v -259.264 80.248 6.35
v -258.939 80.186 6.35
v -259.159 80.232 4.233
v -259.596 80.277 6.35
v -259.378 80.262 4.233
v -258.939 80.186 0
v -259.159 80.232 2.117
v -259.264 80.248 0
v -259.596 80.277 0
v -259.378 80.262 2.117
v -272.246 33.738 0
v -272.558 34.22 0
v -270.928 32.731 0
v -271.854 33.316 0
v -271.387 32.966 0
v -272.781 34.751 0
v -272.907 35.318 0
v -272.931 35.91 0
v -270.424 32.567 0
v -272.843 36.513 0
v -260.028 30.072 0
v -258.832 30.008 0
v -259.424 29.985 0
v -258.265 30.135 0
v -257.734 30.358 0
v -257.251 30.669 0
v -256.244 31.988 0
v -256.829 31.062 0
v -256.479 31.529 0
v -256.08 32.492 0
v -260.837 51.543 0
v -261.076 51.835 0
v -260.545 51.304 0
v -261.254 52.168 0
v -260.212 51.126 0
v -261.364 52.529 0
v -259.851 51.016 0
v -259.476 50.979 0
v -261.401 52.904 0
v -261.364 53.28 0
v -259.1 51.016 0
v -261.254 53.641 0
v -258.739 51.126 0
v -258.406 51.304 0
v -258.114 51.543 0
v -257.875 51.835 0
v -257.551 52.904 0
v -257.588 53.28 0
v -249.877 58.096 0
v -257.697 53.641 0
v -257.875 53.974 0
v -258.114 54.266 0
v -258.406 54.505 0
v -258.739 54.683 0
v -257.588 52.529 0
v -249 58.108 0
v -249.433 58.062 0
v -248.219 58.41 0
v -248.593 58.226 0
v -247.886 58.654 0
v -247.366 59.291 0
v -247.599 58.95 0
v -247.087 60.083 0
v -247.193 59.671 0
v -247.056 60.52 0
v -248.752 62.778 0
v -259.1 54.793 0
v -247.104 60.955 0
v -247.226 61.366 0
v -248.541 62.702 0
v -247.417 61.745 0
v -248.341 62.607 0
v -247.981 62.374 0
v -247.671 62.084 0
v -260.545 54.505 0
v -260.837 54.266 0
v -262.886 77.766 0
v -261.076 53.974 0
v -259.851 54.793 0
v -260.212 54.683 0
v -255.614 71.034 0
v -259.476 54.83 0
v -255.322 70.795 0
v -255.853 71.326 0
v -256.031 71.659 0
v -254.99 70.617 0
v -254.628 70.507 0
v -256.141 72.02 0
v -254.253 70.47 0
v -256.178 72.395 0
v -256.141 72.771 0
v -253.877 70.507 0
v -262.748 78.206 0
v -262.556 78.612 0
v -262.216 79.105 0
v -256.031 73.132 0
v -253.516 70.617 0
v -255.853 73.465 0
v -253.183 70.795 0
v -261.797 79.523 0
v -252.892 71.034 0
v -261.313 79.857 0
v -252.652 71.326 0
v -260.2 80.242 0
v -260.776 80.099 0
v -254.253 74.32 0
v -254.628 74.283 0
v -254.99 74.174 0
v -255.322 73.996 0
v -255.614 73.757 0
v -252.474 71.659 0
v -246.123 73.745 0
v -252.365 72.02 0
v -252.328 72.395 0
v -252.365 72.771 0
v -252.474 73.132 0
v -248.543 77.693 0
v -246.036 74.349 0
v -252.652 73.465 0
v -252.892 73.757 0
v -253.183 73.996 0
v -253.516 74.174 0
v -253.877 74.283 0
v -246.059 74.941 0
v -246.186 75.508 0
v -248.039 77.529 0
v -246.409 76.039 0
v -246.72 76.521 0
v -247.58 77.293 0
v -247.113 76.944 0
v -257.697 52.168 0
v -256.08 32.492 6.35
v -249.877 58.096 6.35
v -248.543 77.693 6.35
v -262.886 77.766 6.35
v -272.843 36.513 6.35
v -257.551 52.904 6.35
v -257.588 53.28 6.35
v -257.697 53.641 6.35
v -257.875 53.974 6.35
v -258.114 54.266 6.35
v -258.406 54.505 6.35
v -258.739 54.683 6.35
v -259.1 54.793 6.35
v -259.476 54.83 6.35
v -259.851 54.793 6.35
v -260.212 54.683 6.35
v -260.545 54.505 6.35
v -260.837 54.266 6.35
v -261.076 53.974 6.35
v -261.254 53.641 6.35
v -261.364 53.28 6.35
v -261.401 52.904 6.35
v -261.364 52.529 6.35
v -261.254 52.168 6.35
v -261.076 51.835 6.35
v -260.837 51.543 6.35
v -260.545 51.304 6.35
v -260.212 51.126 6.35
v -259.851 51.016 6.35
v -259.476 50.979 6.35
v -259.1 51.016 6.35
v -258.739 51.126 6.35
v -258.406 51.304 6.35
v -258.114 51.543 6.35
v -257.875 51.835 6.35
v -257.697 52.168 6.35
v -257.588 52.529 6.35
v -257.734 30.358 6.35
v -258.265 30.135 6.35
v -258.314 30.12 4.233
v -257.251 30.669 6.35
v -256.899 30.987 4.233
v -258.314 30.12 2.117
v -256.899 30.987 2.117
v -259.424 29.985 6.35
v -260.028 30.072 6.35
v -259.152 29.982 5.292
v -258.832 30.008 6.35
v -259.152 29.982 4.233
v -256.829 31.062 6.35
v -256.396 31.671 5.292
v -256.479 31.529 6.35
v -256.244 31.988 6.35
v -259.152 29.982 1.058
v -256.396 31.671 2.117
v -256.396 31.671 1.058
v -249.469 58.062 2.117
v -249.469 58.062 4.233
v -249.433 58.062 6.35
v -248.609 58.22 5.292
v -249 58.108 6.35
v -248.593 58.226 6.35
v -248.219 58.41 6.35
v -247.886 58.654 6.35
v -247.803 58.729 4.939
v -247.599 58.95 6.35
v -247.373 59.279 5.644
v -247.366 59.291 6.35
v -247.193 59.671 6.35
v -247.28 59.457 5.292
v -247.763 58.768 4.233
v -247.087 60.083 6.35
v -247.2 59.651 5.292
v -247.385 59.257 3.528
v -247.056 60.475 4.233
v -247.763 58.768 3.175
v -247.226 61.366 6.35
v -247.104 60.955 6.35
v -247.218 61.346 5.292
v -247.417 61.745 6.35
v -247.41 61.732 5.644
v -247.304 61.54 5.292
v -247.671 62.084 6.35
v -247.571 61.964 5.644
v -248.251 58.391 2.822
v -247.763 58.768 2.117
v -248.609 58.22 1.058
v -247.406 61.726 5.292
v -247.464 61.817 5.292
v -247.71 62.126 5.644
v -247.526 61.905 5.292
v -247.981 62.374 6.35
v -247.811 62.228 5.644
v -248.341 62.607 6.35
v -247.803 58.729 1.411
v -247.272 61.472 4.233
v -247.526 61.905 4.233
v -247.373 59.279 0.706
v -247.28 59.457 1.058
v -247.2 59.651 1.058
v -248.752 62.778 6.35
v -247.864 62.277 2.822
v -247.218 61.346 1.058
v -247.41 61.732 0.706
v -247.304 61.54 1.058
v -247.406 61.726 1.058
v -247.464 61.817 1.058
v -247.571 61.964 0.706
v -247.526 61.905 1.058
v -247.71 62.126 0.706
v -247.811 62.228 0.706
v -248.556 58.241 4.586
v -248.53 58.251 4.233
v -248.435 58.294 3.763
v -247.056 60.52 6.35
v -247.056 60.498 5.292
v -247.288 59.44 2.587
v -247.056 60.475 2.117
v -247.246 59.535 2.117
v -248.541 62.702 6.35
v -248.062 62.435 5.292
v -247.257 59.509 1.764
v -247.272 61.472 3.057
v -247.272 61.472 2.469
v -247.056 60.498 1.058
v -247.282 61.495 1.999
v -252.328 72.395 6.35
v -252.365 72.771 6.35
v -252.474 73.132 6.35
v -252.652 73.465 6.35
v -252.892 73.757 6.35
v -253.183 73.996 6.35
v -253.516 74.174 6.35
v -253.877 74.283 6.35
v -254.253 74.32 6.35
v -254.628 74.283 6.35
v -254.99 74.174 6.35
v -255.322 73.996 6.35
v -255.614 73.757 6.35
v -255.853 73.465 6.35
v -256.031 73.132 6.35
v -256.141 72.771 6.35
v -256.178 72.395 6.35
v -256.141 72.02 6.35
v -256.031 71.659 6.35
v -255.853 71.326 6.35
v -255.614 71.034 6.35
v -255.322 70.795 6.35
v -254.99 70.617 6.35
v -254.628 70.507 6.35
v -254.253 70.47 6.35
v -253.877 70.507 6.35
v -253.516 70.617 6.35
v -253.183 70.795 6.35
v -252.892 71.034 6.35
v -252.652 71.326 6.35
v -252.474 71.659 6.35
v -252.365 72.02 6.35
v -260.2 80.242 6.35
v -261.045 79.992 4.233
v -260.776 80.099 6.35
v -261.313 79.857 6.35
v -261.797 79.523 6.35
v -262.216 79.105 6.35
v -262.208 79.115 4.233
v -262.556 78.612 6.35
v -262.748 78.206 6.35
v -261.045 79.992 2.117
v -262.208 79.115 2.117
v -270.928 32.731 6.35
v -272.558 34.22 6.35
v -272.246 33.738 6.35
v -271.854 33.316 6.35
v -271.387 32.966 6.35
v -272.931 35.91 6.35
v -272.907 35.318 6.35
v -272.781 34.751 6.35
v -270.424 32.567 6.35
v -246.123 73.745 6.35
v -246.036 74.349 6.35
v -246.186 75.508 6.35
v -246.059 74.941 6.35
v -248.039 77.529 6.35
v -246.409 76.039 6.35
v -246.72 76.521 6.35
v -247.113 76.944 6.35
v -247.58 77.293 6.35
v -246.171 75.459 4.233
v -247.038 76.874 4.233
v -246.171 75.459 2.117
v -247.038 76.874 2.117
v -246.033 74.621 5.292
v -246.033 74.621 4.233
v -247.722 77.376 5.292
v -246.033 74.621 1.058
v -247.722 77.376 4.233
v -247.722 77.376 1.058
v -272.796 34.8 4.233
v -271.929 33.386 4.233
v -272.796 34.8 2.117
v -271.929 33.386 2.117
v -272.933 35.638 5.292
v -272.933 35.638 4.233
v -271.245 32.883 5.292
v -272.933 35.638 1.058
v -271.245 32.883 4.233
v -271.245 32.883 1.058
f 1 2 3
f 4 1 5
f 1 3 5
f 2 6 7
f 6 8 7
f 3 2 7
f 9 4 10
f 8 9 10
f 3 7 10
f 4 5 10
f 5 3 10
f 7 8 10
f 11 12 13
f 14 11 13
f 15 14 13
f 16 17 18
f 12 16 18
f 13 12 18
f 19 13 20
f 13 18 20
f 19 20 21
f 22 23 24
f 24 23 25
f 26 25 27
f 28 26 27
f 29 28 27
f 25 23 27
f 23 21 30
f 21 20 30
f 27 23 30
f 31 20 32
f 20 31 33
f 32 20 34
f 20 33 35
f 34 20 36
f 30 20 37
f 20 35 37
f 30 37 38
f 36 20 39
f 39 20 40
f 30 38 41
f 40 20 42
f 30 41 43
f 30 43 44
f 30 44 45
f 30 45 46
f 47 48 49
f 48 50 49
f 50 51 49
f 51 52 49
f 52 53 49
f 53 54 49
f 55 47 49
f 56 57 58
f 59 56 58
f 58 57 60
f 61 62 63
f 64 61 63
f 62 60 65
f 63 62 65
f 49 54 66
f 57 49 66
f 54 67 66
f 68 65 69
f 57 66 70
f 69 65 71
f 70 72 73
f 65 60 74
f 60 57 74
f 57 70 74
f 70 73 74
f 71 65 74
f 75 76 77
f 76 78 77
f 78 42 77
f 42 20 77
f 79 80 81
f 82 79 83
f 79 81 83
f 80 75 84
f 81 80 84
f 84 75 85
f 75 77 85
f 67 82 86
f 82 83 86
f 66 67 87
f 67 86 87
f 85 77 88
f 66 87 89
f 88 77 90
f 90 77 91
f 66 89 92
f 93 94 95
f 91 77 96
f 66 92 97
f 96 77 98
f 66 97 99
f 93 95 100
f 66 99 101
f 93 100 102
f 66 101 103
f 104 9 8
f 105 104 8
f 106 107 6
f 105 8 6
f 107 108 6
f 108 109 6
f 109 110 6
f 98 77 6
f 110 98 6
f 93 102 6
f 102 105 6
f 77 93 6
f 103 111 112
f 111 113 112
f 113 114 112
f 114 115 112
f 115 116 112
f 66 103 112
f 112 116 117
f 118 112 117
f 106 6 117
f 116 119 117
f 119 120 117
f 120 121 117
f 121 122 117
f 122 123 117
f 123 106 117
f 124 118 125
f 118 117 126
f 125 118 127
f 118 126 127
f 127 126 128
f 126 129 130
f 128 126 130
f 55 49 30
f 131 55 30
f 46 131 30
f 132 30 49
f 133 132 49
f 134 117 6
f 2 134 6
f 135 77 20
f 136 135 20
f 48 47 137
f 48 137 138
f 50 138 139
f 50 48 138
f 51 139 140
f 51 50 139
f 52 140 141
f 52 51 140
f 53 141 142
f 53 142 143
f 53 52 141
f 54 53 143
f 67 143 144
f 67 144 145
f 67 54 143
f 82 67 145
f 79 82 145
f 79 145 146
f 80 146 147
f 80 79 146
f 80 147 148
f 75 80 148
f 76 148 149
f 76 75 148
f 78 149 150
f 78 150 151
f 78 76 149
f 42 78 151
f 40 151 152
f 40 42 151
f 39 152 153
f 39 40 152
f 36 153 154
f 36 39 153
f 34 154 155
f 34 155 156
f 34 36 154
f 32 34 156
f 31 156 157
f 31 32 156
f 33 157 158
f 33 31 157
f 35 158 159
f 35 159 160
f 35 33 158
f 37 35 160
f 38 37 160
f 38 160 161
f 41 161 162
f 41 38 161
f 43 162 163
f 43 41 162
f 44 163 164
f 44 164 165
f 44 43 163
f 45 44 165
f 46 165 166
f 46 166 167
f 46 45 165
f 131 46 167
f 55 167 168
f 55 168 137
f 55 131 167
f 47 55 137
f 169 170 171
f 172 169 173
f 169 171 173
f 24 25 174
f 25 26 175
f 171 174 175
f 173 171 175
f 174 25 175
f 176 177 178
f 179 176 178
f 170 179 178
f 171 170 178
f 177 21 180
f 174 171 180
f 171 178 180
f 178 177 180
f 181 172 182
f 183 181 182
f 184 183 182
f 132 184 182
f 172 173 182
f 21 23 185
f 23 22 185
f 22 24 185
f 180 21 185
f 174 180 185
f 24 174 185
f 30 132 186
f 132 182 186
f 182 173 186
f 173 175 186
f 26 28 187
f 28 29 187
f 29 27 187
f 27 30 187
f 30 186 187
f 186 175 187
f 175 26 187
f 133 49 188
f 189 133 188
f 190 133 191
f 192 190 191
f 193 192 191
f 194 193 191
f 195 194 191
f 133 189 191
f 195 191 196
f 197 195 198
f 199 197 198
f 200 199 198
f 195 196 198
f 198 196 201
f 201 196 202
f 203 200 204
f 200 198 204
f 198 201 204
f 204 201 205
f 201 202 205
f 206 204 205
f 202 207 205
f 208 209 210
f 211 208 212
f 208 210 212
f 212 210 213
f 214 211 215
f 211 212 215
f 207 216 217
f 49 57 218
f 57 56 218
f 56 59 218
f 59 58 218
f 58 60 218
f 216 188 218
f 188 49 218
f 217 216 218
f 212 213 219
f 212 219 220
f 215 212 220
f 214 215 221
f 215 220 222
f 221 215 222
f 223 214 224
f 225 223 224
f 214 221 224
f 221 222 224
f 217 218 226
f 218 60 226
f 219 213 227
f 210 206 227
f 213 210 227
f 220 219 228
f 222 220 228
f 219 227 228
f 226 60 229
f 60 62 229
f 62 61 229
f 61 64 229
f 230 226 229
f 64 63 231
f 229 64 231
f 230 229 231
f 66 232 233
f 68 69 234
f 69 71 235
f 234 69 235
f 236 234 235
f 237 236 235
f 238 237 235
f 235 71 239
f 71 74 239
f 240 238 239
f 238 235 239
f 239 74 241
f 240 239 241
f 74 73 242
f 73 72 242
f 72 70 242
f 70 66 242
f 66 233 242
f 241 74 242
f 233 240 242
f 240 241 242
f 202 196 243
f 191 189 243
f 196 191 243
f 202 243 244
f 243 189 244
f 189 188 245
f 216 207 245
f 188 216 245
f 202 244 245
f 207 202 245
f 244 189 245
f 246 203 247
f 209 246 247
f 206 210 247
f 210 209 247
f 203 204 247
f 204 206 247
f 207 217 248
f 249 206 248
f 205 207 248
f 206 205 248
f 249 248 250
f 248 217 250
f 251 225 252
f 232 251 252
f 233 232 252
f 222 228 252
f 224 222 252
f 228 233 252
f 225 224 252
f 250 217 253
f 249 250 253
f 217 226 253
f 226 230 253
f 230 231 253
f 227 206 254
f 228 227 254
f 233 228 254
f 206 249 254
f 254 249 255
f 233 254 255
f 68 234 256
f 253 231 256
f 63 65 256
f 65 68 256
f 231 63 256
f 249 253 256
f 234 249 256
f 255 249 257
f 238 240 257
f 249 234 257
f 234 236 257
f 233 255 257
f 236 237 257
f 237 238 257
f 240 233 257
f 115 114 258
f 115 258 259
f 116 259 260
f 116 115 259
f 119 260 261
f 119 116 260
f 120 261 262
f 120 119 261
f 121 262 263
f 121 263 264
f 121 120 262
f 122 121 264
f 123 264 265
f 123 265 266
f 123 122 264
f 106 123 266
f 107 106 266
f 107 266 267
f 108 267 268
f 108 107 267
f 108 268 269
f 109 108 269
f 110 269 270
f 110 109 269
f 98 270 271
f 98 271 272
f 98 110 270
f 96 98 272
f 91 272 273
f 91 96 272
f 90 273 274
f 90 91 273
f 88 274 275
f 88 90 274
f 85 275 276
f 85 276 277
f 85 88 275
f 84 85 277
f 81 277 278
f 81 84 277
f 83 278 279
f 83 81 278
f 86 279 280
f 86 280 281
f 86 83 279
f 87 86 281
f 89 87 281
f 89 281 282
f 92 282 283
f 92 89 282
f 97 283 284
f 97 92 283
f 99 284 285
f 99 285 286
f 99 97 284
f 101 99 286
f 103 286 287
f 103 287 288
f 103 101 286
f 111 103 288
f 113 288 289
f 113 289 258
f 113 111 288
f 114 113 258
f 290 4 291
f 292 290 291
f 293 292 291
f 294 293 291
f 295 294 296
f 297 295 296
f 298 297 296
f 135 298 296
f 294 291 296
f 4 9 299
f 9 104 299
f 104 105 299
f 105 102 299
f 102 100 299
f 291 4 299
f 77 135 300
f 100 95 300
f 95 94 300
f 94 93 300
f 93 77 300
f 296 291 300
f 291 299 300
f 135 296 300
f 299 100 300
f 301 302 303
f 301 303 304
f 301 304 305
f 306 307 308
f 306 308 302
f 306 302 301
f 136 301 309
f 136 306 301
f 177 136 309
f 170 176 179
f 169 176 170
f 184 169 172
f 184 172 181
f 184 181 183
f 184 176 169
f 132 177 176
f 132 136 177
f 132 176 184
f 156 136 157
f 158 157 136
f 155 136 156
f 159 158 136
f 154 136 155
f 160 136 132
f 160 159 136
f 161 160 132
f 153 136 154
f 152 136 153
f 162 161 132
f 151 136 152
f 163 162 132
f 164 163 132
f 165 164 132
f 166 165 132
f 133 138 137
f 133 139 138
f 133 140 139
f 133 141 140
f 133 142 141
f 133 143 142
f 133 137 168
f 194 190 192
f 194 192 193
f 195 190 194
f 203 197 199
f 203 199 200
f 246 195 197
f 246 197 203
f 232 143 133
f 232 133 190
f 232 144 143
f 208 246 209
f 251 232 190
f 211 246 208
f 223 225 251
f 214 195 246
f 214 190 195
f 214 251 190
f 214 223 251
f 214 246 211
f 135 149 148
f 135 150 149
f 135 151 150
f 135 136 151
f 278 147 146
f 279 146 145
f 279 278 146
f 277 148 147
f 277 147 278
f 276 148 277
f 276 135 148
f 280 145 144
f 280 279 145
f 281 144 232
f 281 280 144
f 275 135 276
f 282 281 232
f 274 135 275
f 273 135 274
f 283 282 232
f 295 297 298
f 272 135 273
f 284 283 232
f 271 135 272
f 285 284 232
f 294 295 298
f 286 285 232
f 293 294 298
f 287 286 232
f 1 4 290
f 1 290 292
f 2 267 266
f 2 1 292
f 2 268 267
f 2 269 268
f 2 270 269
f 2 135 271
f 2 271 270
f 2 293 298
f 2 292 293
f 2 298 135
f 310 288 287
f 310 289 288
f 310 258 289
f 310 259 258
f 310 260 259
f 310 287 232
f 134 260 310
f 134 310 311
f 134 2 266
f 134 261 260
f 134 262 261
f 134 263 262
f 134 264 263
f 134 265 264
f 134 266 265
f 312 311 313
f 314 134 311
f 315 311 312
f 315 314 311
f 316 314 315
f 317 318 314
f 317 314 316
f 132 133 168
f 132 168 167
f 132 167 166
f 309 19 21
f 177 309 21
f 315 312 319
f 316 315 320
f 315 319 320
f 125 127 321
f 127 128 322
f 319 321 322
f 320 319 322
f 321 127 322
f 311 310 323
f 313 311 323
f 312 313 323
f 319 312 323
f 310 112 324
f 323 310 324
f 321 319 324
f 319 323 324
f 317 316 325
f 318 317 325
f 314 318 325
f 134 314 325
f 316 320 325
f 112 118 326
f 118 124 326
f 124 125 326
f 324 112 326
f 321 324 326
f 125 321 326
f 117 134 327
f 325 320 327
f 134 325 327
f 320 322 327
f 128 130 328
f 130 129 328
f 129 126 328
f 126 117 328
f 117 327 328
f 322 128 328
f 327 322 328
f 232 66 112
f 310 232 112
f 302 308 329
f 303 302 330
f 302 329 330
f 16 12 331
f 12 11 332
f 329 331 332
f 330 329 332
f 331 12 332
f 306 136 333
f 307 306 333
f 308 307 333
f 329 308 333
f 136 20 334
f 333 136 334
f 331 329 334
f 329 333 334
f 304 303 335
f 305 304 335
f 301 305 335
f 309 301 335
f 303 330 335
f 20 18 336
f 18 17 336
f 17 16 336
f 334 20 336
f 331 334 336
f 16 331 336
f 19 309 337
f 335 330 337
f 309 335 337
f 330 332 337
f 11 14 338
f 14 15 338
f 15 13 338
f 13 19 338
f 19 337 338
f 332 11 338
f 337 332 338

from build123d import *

# Parameters (mm, degrees)
MODEL_R             = 1.925069784
BOSS_EXTRUDE1_DEPTH = 6.35


with BuildPart() as part:
    # Model → Boss-Extrude1 (new body)
    with BuildSketch(Plane.XY):
        with BuildLine():
            Line((-262.8855, 77.7663), (-272.8434, 36.5132))
            add(Edge.make_bspline(
                [(-272.8434, 36.5132), (-273.2663, 34.7494), (-272.1875, 32.9898), (-270.4236, 32.5666)],
                knots=[0.142857143, 0.142857143, 0.142857143, 0.142857143, 0.214285714, 0.214285714, 0.214285714, 0.214285714], degree=3))
            Line((-270.4236, 32.5666), (-260.0278, 30.0723))
            add(Edge.make_bspline(
                [(-260.0278, 30.0723), (-258.2636, 29.6496), (-256.5027, 30.7281), (-256.0795, 32.4923)],
                knots=[0.285714286, 0.285714286, 0.285714286, 0.285714286, 0.357142857, 0.357142857, 0.357142857, 0.357142857], degree=3))
            Line((-256.0795, 32.4923), (-249.8766, 58.0964))
            add(Edge.make_bspline(
                [(-249.8766, 58.0964), (-249.742, 58.0727), (-249.6054, 58.0619), (-249.4692, 58.0619)],
                knots=[0.428571429, 0.428571429, 0.428571429, 0.428571429, 0.5, 0.5, 0.5, 0.5], degree=3))
            add(Edge.make_bspline(
                [(-249.4692, 58.0619), (-248.1365, 58.0619), (-247.0559, 59.1417), (-247.0559, 60.4748)],
                knots=[0.5, 0.5, 0.5, 0.5, 0.571428571, 0.571428571, 0.571428571, 0.571428571], degree=3))
            add(Edge.make_bspline(
                [(-247.0559, 60.4748), (-247.0559, 61.5318), (-247.744, 62.4645), (-248.7524, 62.7785)],
                knots=[0.571428571, 0.571428571, 0.571428571, 0.571428571, 0.642857143, 0.642857143, 0.642857143, 0.642857143], degree=3))
            Line((-248.7524, 62.7785), (-246.1231, 73.7453))
            add(Edge.make_bspline(
                [(-246.1231, 73.7453), (-245.7003, 75.5091), (-246.7789, 77.27), (-248.5431, 77.6932)],
                knots=[0.714285714, 0.714285714, 0.714285714, 0.714285714, 0.785714286, 0.785714286, 0.785714286, 0.785714286], degree=3))
            Line((-248.5431, 77.6932), (-258.9389, 80.1862))
            add(Edge.make_bspline(
                [(-258.9389, 80.1862), (-259.1594, 80.2398), (-259.3787, 80.2689), (-259.5963, 80.2772)],
                knots=[0.857142857, 0.857142857, 0.857142857, 0.857142857, 1, 1, 1, 1], degree=3))
            add(Edge.make_bspline(
                [(-259.5963, 80.2772), (-261.1217, 80.3295), (-262.5167, 79.3095), (-262.8855, 77.7663)],
                knots=[0, 0, 0, 0, 0.071428571, 0.071428571, 0.071428571, 0.071428571], degree=3))
        make_face()
        with Locations((-254.25285, 72.3954)):
            Circle(MODEL_R, mode=Mode.SUBTRACT)
        with Locations((-259.47565, 52.9045)):
            Circle(MODEL_R, mode=Mode.SUBTRACT)
    extrude(amount=BOSS_EXTRUDE1_DEPTH)


solid = part.part
